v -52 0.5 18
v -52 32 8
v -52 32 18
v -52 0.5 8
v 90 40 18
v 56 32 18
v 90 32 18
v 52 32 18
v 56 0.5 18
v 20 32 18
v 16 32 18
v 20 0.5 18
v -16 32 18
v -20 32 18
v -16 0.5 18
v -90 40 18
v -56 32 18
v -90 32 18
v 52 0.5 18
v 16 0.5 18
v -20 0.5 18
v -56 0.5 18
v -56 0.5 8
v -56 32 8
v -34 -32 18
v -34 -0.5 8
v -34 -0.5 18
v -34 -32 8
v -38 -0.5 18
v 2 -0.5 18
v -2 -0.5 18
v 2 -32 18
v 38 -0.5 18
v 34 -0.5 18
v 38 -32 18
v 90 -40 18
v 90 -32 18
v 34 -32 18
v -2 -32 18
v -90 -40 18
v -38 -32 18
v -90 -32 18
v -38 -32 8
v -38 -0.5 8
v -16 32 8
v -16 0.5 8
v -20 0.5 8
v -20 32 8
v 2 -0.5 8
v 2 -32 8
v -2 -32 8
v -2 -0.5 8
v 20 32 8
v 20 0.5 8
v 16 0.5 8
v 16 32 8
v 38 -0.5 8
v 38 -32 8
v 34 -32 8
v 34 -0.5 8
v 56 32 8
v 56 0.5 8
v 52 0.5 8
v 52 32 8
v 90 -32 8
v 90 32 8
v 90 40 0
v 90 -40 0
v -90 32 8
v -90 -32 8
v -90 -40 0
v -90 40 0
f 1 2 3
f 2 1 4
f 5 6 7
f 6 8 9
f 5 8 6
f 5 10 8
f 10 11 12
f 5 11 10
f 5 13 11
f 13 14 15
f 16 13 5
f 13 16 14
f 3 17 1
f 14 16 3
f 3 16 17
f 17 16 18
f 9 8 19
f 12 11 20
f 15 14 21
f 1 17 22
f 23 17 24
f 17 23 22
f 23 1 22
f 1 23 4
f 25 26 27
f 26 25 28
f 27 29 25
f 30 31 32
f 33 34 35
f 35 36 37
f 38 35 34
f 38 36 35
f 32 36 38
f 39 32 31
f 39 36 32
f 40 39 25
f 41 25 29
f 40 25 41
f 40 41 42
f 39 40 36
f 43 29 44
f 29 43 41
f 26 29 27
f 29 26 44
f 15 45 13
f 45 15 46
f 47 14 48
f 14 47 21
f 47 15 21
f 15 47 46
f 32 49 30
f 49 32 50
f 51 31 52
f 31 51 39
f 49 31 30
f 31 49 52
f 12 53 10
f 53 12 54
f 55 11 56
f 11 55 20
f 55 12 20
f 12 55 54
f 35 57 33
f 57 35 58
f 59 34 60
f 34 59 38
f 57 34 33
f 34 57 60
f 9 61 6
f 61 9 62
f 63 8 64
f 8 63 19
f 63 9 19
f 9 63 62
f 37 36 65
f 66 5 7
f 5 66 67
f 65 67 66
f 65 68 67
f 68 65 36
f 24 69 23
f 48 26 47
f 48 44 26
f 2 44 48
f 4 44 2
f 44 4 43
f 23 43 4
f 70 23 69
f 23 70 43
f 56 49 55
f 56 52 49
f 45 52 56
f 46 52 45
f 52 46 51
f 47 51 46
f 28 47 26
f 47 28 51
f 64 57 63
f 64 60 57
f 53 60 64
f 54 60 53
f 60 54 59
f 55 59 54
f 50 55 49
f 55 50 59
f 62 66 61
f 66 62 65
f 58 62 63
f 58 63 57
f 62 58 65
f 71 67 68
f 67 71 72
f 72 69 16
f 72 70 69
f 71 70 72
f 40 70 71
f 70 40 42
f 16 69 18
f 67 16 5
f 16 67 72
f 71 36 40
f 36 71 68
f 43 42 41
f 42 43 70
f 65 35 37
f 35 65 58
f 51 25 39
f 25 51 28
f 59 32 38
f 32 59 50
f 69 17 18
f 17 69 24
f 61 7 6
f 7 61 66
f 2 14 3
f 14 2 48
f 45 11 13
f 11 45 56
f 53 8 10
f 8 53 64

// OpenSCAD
$fn = 32;

// ----------------------------------------------------------------------
// Rib frame 180 x 80 x 18
// 7 ribs at 18 mm pitch, staggered
// ----------------------------------------------------------------------

// --- parameters (mm) ---
frame = [180, 80, 8];  // base plate size (x, y, z)
rail_w = 8;            // side rail width
ribs = 7;              // number of ribs
rib_t = 4;             // rib thickness
rib_h = 10;            // rib height above the base plate
pitch = 18;            // pitch between rib centres

// --- derived feature positions (mm) ---
span = (ribs - 1) * pitch;          // = 108   distance between the outer ribs
origin_x = -span / 2;               // = -54   X of the first rib
rib_len = frame[1] / 2 - rail_w + 0.5;  // = 32.5   length of a staggered rib
rib_y = 0.5 + rib_len / 2;          // = 16.75   Y of a staggered rib centre
row_offset = 2 * rib_y;             // = 33.5   distance between the two rows
feature_centers = [
  [origin_x + 0 * pitch, rib_y],
  [origin_x + 1 * pitch, -rib_y],
  [origin_x + 2 * pitch, rib_y],
  [origin_x + 3 * pitch, -rib_y],
  [origin_x + 4 * pitch, rib_y],
  [origin_x + 5 * pitch, -rib_y],
  [origin_x + 6 * pitch, rib_y]
];   // rib centre line, drives the rib loop

// base plate, two side rails, then the ribs read straight off feature_centers
union() {
  translate([-frame[0] / 2, -frame[1] / 2, 0]) cube(frame);
  translate([-frame[0] / 2, -frame[1] / 2, 0]) cube([frame[0], rail_w, frame[2] + rib_h]);
  translate([-frame[0] / 2, frame[1] / 2 - rail_w, 0]) cube([frame[0], rail_w, frame[2] + rib_h]);
  for (centre = feature_centers)
    translate([centre[0] - rib_t / 2, centre[1] - rib_len / 2, frame[2] - 1])
      cube([rib_t, rib_len, rib_h + 1]);
}
